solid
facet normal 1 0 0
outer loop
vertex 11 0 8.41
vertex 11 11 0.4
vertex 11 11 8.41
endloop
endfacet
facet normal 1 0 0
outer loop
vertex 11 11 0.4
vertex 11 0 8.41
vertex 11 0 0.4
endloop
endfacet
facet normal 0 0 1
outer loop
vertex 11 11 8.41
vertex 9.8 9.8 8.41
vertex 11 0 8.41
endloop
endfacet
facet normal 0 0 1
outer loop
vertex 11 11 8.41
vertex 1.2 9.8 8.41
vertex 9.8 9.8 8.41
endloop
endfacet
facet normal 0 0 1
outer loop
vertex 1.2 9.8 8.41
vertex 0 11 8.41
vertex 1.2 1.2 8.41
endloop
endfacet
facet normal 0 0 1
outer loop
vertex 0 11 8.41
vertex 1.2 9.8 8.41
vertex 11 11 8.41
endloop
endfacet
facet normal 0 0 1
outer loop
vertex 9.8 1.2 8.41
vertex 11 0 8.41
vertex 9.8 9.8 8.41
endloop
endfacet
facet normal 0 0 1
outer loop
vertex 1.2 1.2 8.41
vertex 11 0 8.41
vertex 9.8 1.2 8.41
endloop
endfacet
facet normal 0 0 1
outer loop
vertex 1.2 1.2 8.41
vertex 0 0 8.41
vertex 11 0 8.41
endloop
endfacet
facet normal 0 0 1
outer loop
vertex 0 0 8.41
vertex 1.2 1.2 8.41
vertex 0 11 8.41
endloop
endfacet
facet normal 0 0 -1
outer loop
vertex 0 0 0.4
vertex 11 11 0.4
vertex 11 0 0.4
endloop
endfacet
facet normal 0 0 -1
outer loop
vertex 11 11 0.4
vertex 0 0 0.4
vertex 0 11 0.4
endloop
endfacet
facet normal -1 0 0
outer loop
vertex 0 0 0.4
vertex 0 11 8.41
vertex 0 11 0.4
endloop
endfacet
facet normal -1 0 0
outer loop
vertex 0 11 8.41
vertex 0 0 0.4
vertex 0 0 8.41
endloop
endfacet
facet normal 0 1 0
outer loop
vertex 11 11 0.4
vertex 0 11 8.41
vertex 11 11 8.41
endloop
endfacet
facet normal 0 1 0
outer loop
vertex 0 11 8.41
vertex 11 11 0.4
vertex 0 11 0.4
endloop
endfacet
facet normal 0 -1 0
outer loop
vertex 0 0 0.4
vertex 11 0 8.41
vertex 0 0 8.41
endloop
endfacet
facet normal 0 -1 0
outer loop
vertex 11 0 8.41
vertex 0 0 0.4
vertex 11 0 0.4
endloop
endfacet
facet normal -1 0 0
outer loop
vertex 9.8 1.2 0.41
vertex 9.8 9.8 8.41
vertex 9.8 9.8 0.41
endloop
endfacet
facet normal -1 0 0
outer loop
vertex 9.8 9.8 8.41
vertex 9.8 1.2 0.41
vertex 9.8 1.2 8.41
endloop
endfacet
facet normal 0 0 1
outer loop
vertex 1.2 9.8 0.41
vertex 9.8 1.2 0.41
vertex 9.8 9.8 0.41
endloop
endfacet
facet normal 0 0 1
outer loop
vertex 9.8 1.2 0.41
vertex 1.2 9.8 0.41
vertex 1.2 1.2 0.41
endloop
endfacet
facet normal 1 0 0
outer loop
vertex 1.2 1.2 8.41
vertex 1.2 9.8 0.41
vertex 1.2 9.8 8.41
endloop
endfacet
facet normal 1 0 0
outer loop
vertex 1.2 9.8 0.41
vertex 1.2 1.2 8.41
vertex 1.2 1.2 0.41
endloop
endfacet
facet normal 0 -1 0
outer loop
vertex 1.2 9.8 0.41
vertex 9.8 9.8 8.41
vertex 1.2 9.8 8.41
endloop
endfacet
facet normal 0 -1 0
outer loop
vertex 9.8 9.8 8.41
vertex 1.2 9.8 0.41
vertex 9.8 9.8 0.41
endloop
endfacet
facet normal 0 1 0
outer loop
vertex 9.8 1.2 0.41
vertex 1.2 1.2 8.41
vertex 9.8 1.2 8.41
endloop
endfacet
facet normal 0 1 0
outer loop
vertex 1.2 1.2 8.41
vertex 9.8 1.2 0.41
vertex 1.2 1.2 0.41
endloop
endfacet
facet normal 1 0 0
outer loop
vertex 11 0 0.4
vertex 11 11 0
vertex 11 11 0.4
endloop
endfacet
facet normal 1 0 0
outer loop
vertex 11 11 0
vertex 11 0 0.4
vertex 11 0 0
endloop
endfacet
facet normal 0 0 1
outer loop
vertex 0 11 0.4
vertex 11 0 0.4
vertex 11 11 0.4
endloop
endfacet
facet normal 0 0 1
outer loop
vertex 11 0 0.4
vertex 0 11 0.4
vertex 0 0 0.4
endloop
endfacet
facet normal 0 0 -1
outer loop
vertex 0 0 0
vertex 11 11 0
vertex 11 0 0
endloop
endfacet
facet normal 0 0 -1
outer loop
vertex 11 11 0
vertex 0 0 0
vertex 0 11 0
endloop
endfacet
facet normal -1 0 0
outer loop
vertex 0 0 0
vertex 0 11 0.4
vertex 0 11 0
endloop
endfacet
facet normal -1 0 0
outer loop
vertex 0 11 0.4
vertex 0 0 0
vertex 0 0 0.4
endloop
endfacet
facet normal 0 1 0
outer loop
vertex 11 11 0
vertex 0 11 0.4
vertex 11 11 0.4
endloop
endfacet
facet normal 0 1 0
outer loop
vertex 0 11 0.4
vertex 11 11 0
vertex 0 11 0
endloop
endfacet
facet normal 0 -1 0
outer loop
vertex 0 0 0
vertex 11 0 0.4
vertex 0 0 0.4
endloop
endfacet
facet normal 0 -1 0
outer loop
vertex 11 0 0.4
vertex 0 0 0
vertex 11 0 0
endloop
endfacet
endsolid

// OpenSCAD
// file: ../../Base/Rotation.scad
// Fischertechnik Box Foundation
// Geometry Helpers Rotation

include <PlacementOptions.scad>

// getRotatedSpace(space, rotation=NoRotation)
// Rotates the space dependent on the specified rotation

function getRotatedSpace(space, rotation=NoRotation) = [
    (rotation == Rotate90 || rotation == Rotate270) ? space.y : space.x,
    (rotation == Rotate90 || rotation == Rotate270) ? space.x : space.y
];

// Rotates the given space around the fixed left lower corner
// space = the space the children needs as width/depth list [width,depth]
// rotation = 0 Rotate0 degrees, 1 Rotate90 degrees, 2 Rotate180 degrees, 3 Rotate270 degrees (equivalent to -90)

module RotateFix(space, rotation=NoRotation) {
    dy = (rotation == Rotate0 || rotation == Rotate270) ? 0 :
        (rotation == Rotate90) ? space.x :
        space.y;
    dx = (rotation < Rotate180) ? 0 :
        (rotation == Rotate180) ? space.x :
        space.y;
    
    translate([dx, dy, 0])
        rotate([0, 0, rotations[rotation]])
            children();
}
// file: ../../Base/Alignment.scad
// Fischertechnik Box Foundation
// Geometry Helpers Alignment

include <PlacementOptions.scad>

// getAlignedX(elementWidth, spaceWidth, align=AlignRight, offset=0)
// Gets the aligned X offset of an element with the given
// width in the given space.
// elementWidth = The width of the element to positon
// spaceWidth = The space where the element should be aligned
// align = 0 AlignLeft, 1 AlignCenter, 2 AlignRight
// offset = an optional offset from the aligned position. When
// aligned left or centered, then positive values are in X direction.
// When aligned right then positive values are in negative X direction.

function getAlignedX(elementWidth, spaceWidth, align=AlignRight, offset=0) =
    (align == AlignLeft) ?
        offset :
        ((align == AlignCenter) ?
        (spaceWidth - elementWidth)/2 + offset :
        spaceWidth - offset - elementWidth);

// getAlignedY(elementDepth, spaceDepth, align=AlignTop, offset=0)
// Gets the aligned Y offset of an element with the given
// depth in the given space.
// elementDepth = The depth of the element to positon
// spaceDepth = The space where the element should be aligned
// align = 0 AlignBottom, 1 AlignCenter, 2 AlignTop
// offset = an optional offset from the aligned position. When
// aligned bottom or centered, then positive values are in Y direction.
// When aligned top then positive values are in negative Y direction.

function getAlignedY(elementDepth, spaceDepth, align=AlignTop, offset=0) =
    (align == AlignBottom) ?
        offset :
        ((align == AlignCenter) ?
        (spaceDepth - elementDepth)/2 + offset :
        spaceDepth - offset - elementDepth);
// file: ../../Base/PlacementOptions.scad
// Fischertechnik Box Foundation
// Placement Options

// Alignment
NoAlign = 0;
AlignLeft = 1;
AlignBottom = 2;
AlignCenter = 3;
AlignRight = 4;
AlignTop = 5;

// Element rotation degree steps
rotations = [0, -90, -180, -270];

// Rotation
NoRotation = 0;
Rotate0 = 0;
Rotate90 = 1;
Rotate180 = 2;
Rotate270 = 3;

// Docking (seen from above)
NoDock = -1;
DockLeft = 0;
DockTop = 1;
DockRight = 2;
DockCorner = 2;
DockBottom = 3;

// Web corners
LowerLeft = 0;
UpperLeft = 1;
UpperRight = 2;
LowerRight = 3;

// Web position relative to corner
LeftOfCorner = 0;
RightOfCorner = 1;
// file: ../../Base/Boxes.scad
// Fischertechnik Box Foundation
// Pre-designed Boxes

use <Constants.scad>

include <PlacementOptions.scad>

box190Width = 190;
box190Depth = 130;
box130Width = 130;
box130Depth = 95;

// Values are from an original ec3 box
topBottomDifference = 1.5;
outerHeight = 40;
innerHeight = 38.2;
baseThickness = outerHeight - innerHeight;
stackExcess = 5.7;
radius = 3.5;
wallThickness = 1.5;
tolerance = 0.2;
stackOffset = innerHeight - stackExcess;

boxUsageHeight = stackOffset;
boxWallThickness = wallThickness;
boxBaseThickness = baseThickness;
boxWebWidth = 3.0;

// getBoxWallThickness()
// Gets the wall thickness of a Fischertechnik Box
function getBoxWallThickness() = boxWallThickness;

// getBoxUsageHeight()
// Gets the usable height of a Fischertechnik box
function getBoxUsageHeight() = boxUsageHeight;

// getBoxInnerHeight()
// Gets the inner height of a Fischertechnik box, including the stack excess
function getBoxInnerHeight() = innerHeight;

// getBoxBaseThickness()
// Gets the thickness of the Fischertechnik box base.
function getBoxBaseThickness() = boxBaseThickness;

// getBoxWebWidth()
// Gets the width of a box web
function getBoxWebWidth() = boxWebWidth;

// getBox190Space()
// Gets the usable inner space of a Box 190 as an x/y-list
function getBox190Space() = [
    box190Width - 2*getBoxWallThickness() - topBottomDifference, 
    box190Depth - 2*getBoxWallThickness() - topBottomDifference ];

// BoxBase(width, depth)
// Creates an empty stackable Fischertechnik compatible box
// width = Outer width of the box (190, 130, ...)
// depth = Outer depth of the box (130, 95, ...)

module BoxBase(width, depth, height=outerHeight) {    
    thinPlate = 0.01;

    innerHeight = height - baseThickness;    
    
    module BodyPlate(width, depth) {
        translate([radius, radius])
        hull() {
            w = width-2*radius;
            d = depth-2*radius;
            cube([w, d, thinPlate]);
            cylinder(thinPlate, r=radius, $fn=getFragments());
            translate([w, 0])
                cylinder(thinPlate, r=radius, $fn=getFragments());
            translate([w, d])
                cylinder(thinPlate, r=radius, $fn=getFragments());
            translate([0, d])
                cylinder(thinPlate, r=radius, $fn=getFragments());
        }
    }
    
    module Body(tolerance=tolerance) {
        hull() {
            // Bottom with tolerance to fit into the original boxes when stacked
            translate([-wallThickness+tolerance, -wallThickness+tolerance, -baseThickness])
                BodyPlate(width-topBottomDifference-2*tolerance, depth-topBottomDifference-2*tolerance);
            
            // Top
            translate([-wallThickness-topBottomDifference/2, -wallThickness-topBottomDifference/2, innerHeight-thinPlate])
                BodyPlate(width, depth);
         }
    }

    module Cutoff() {
        hull() {
            coWidth = width - 2*wallThickness;
            coDepth = depth - 2*wallThickness;
            
            // Bottom
            BodyPlate(coWidth-topBottomDifference, coDepth-topBottomDifference);

            // Top
            translate([-topBottomDifference/2, -topBottomDifference/2, innerHeight+thinPlate]) 
                BodyPlate(coWidth, coDepth);
        }
    }
    
    difference() {        
        Body();
        Cutoff();
        stackOffset = innerHeight - stackExcess;
        translate([0, 0, stackOffset + baseThickness])
            Body(tolerance=0);
    }
}

// Creates the Fischertechnik empty box 130x190 mm and places it at position 0,0
// 190x130 are the outer sizes, the inner space is slightly smaller. Use getBox190Space() to get the inner sizes.
// The box is positioned that the usable inner space is at the 0,0,0 position. The

module Box190() {
    BoxBase(box190Width, box190Depth);
}

// Gets the usable inner space of a Box 130 as an x/y-list
function getBox130Space() = [
    box130Width - 2*getBoxWallThickness() - topBottomDifference, 
    box130Depth - 2*getBoxWallThickness() - topBottomDifference ];

// Creates the Fischertechnik empty box 95x130 mm and places it at position 0,0
// 190x130 are the outer sizes, the inner space is slightly smaller. Use getBox190Space() to get the inner sizes.
// The box is positioned that the usable inner space is at the 0,0,0 position. The

module Box130() {
    BoxBase(box130Width, box130Depth);
}

// Creates a web at the specified box walls
// corner 0 = LowerLeft, 1 = UpperLeft, 2 = UpperRight, 3 = LowerRight
// side 0 = LeftOfCorner, 1 = RightOfCorner
// distance = Distance in mm from the corner
// boxSpace = inner width and depth of the box (default: Box 190)
// webWidth = length of the web (default is 3 mms)
// webThickness = thickness of the web (default is 1 mm)

module BoxWeb(corner, side, distance, boxSpace=getBox190Space(), webWidth=getBoxWebWidth(), webThickness=1.0) {
    sink = getBoxWallThickness()/2;

    width = (corner % 2 == 0) ? 
            (side == LeftOfCorner ? webWidth : webThickness) :
            (side == LeftOfCorner ? webThickness : webWidth);

    depth = (corner % 2 == 0) ? 
            (side == RightOfCorner ? webWidth : webThickness) :
            (side == RightOfCorner ? webThickness : webWidth);
    
    xDiff = corner == LowerLeft ? 
                (side == LeftOfCorner ? -sink : distance) :
            (corner == UpperLeft ?                
                (side == LeftOfCorner ? distance : -sink) :
            (corner == UpperRight ?
                (side == LeftOfCorner ? boxSpace.x-webWidth+sink : boxSpace.x-distance-webThickness) :
                (side == LeftOfCorner ? boxSpace.x-distance-webThickness: boxSpace.x-webWidth+sink)));

    yDiff = corner == LowerLeft ? 
                (side == RightOfCorner ? -sink : distance) :
            (corner == UpperLeft ?
                (side == RightOfCorner ? boxSpace.y-distance : boxSpace.y-webWidth+sink) :
            (corner == UpperRight ?
                (side == RightOfCorner ? boxSpace.y-webWidth+sink : boxSpace.y-distance) :
                (side == RightOfCorner ? distance : -sink)));
    
    translate([xDiff, yDiff, -getExcess()])
        cube([width, depth, boxUsageHeight + 2*getExcess()]);
}
// file: ../../Base/Placement.scad
// Fischertechnik Box Foundation
// Geometry Helpers Placement

use <Constants.scad>
use <Alignment.scad>
use <Rotation.scad>
use <Boxes.scad>

include <PlacementOptions.scad>

// Place(x=0, y=0, elementSpace=[0,0], alignX=AlignLeft, alignY=AlignBottom, rotation=Rotate0, boxSpace=getBox190Space())
// Places the child at the specified position
// y = Y-Position. This is a relative position when an X aligment is specified.
// x = X-Position. This is a relative position when an Y aligment is specified.
// elementSpace = space of the element to be placed [x,y]
// alignX = -1=NoAlign, 0 AlignLeft, 1 AlignCenter, 3 AlignRight (elementSpace and boxSpace required!)
// alignY = -1=NoAlign, 2 AlignBottom, 1 AlignCenter, 4 AlignTop (elementSpace and boxSpace required!)
// rotation = 0 Rotate0 0 degrees, 1 Rotate90 90 degrees, 
// 2 Rotate180 180 degrees, 3 Rotate270 270 degrees (equivalent to -90)
// boxSpace = Inner space of the box where the placement occurs [x,y] - default is Box 190x130 inner space

module Place(x=0, y=0, elementSpace=[0,0], 
  alignX=AlignLeft, alignY=AlignBottom, 
  rotation=NoRotation, boxSpace=getBox190Space()) {

    module Position(x, y, space, rotation=Rotate0) {
        translate([x, y, 0])
            RotateFix(space, rotation)
                children();
    }

    space = getRotatedSpace(elementSpace, rotation);
    alignedX = getAlignedX(space.x, boxSpace.x, alignX, x);
    alignedY = getAlignedY(space.y, boxSpace.y, alignY, y);
    Position(alignedX, alignedY, elementSpace, rotation)
        children();
}

// Center(space=getBox130Space(), elementSpace=[0,0])
// space = Space where the children is centered. For cylinder use centered=true and no elementSpace.
// elementSpace = space of the element to be centered [x,y]

module Center(space=getBox190Space(), elementSpace=[0,0]) {
    Place(elementSpace=elementSpace, boxSpace=space, alignX=AlignCenter, alignY=AlignCenter)
        children();
}

// CenterHorizontal(width=0, y=0, offset=0, space=getBox130Space())
// width = Width of the element to be placed.
// y = Y position of the element
// offset = Offset from the center position (negative will be left of the center)
// space = Space where the element is placed

module CenterHorizontal(width=0, y=0, offset=0, space=getBox190Space()) {
    Place(x=offset, y=y, elementSpace=[width, 0], boxSpace=space, alignX=AlignCenter)
        children(0);
}

// CenterVertical(depth=0, x=0, offset=0, space=getBox130Space())
// depth = Depth of the element to be placed.
// x = X position of the element
// offset = Offset from the center position (negative will be down of the center)
// space = Space where the element is placed

module CenterVertical(depth=0, x=0, offset=0, space=getBox190Space()) {
    Place(x=x, y=offset, elementSpace=[0, depth], boxSpace=space, alignY=AlignCenter)
        children(0);
}

// getIsVertical(align)
// True if the specified alignment needs a vertical orientation for a divider (AlignRight, AlignLeft)

function getIsVertical(align) = (align == AlignRight || align == AlignLeft);

// getIsHorizontal(align)
// True if the specified alignment needs a horizontal orientation for a divider (AlignTop, AlignBottom)

function getIsHorizontal(align) = (align == AlignTop || align == AlignBottom);
// file: ../../Elements/AxisClip10.scad
// Fischertechnik Box Library
// Axis for clip 10
// 31023

use <../ModelBase/Simple.scad>
use <../Base/Constants.scad>

width = 12;
depth = 12;
height = 23;
upperDiameter = 3.6;
clipHeight = 10;

// getAxisClip10Space()
// Gets the space of a frame for a clip 10 with spring ring (mot2)

function getAxisClip10Space() = [width, depth, height];

// AxisClip10(height, clipHeight)
// Axis for clip 10 with spring ring (mot2)
// height = Height of the complete axis
// clipHeight = Height of the rt for the clip (standard is 10, in mot3 its only 7)

module AxisClip10(height=height, clipHeight=clipHeight) {
    LeveledAxisWithSpace(height, height-clipHeight, getAxisClip10Space(), diameter=upperDiameter);
}

// Tests
color("lightgray")
AxisClip10();
// file: ../../Base/Constants.scad
// Fischertechnik Box Foundation
// Constants

// Constant values necessary for multiple elements

// Base constants
dividerThickness = 1.2;
excess = 0.01;
fragments = 90;
tolerance = 0.8;

// Gets the thickness of a divider 
function getDividerThickness() = dividerThickness;

// Gets the excess that is used to merge walls into each other
function getExcess() = excess;

// Gets amount of fragments of a cylinder
function getFragments() = fragments;

// Gets the inner tolerance of a frame to each side
function getTolerance() = tolerance;


// Fischertechnik specific constants
axisDiameter = 4;
axisBottomDiameter = axisDiameter + 1;
standardEdgeDistance = 2.5;
standardWebDistance = 11.5;
standardCornerLength = 15;
tubeWallFactor = 0.8;
smallPartsFrameHeight = 20;

// Gets axis diameter
function getAxisDiameter() = axisDiameter;

// Gets axis bottom diameter for thicker part at the bottom
function getAxisBottomDiameter() = axisBottomDiameter;

// gets the standard distance to the wall of the box for dockable frames with webs
function getStandardEdgeDistance() = standardEdgeDistance;

// gets the standard distance of each web to the corner of the dockable frame
function getStandardWebDistance() = standardWebDistance;

// gets the standard length of the corner walls of a dockable frame
function getStandardCornerLength() = standardCornerLength;

// gets the wall thickness of a tube.
function getTubeWallThickness() = tubeWallFactor * getDividerThickness();

// gets the frame height for docked small parts boxes.
function getSmallPartsFrameHeight() = smallPartsFrameHeight;
// file: ../../Elements/FrameShortHook.scad
// Fischertechnik Box Library
// Frame for Short Hook
// 38225

use <../ModelBase/Simple.scad>

width = 7.8;
depth = 7.8;
height = 8;

// getFrameShortHookSpace()
// Gets the space of a frame for a short hook

function getFrameShortHookSpace() = getFrameOuterVolume([width, depth, height]);

// FrameShortHook()
// Frame for short hook.

module FrameShortHook() {
    Frame([width, depth, height]);
}

// Tests
color("lightgray")
FrameShortHook();
// file: ../TestPrint.scad
// 3D Print Test Base

use <../Base/Constants.scad>

use <../Elements/AxisClip10.scad>

module TestPrint(elementSpace) {
    cube([elementSpace.x, elementSpace.y, 0.4]);
    translate([0,0,0.4+getExcess()]) {
        children();
    }
}

TestPrint(getAxisClip10Space())
    AxisClip10();
// main file
// 3D Print Test
// FrameShortHook

use <../TestPrint.scad>
use <../../Elements/FrameShortHook.scad>

TestPrint(getFrameShortHookSpace())
    FrameShortHook();
